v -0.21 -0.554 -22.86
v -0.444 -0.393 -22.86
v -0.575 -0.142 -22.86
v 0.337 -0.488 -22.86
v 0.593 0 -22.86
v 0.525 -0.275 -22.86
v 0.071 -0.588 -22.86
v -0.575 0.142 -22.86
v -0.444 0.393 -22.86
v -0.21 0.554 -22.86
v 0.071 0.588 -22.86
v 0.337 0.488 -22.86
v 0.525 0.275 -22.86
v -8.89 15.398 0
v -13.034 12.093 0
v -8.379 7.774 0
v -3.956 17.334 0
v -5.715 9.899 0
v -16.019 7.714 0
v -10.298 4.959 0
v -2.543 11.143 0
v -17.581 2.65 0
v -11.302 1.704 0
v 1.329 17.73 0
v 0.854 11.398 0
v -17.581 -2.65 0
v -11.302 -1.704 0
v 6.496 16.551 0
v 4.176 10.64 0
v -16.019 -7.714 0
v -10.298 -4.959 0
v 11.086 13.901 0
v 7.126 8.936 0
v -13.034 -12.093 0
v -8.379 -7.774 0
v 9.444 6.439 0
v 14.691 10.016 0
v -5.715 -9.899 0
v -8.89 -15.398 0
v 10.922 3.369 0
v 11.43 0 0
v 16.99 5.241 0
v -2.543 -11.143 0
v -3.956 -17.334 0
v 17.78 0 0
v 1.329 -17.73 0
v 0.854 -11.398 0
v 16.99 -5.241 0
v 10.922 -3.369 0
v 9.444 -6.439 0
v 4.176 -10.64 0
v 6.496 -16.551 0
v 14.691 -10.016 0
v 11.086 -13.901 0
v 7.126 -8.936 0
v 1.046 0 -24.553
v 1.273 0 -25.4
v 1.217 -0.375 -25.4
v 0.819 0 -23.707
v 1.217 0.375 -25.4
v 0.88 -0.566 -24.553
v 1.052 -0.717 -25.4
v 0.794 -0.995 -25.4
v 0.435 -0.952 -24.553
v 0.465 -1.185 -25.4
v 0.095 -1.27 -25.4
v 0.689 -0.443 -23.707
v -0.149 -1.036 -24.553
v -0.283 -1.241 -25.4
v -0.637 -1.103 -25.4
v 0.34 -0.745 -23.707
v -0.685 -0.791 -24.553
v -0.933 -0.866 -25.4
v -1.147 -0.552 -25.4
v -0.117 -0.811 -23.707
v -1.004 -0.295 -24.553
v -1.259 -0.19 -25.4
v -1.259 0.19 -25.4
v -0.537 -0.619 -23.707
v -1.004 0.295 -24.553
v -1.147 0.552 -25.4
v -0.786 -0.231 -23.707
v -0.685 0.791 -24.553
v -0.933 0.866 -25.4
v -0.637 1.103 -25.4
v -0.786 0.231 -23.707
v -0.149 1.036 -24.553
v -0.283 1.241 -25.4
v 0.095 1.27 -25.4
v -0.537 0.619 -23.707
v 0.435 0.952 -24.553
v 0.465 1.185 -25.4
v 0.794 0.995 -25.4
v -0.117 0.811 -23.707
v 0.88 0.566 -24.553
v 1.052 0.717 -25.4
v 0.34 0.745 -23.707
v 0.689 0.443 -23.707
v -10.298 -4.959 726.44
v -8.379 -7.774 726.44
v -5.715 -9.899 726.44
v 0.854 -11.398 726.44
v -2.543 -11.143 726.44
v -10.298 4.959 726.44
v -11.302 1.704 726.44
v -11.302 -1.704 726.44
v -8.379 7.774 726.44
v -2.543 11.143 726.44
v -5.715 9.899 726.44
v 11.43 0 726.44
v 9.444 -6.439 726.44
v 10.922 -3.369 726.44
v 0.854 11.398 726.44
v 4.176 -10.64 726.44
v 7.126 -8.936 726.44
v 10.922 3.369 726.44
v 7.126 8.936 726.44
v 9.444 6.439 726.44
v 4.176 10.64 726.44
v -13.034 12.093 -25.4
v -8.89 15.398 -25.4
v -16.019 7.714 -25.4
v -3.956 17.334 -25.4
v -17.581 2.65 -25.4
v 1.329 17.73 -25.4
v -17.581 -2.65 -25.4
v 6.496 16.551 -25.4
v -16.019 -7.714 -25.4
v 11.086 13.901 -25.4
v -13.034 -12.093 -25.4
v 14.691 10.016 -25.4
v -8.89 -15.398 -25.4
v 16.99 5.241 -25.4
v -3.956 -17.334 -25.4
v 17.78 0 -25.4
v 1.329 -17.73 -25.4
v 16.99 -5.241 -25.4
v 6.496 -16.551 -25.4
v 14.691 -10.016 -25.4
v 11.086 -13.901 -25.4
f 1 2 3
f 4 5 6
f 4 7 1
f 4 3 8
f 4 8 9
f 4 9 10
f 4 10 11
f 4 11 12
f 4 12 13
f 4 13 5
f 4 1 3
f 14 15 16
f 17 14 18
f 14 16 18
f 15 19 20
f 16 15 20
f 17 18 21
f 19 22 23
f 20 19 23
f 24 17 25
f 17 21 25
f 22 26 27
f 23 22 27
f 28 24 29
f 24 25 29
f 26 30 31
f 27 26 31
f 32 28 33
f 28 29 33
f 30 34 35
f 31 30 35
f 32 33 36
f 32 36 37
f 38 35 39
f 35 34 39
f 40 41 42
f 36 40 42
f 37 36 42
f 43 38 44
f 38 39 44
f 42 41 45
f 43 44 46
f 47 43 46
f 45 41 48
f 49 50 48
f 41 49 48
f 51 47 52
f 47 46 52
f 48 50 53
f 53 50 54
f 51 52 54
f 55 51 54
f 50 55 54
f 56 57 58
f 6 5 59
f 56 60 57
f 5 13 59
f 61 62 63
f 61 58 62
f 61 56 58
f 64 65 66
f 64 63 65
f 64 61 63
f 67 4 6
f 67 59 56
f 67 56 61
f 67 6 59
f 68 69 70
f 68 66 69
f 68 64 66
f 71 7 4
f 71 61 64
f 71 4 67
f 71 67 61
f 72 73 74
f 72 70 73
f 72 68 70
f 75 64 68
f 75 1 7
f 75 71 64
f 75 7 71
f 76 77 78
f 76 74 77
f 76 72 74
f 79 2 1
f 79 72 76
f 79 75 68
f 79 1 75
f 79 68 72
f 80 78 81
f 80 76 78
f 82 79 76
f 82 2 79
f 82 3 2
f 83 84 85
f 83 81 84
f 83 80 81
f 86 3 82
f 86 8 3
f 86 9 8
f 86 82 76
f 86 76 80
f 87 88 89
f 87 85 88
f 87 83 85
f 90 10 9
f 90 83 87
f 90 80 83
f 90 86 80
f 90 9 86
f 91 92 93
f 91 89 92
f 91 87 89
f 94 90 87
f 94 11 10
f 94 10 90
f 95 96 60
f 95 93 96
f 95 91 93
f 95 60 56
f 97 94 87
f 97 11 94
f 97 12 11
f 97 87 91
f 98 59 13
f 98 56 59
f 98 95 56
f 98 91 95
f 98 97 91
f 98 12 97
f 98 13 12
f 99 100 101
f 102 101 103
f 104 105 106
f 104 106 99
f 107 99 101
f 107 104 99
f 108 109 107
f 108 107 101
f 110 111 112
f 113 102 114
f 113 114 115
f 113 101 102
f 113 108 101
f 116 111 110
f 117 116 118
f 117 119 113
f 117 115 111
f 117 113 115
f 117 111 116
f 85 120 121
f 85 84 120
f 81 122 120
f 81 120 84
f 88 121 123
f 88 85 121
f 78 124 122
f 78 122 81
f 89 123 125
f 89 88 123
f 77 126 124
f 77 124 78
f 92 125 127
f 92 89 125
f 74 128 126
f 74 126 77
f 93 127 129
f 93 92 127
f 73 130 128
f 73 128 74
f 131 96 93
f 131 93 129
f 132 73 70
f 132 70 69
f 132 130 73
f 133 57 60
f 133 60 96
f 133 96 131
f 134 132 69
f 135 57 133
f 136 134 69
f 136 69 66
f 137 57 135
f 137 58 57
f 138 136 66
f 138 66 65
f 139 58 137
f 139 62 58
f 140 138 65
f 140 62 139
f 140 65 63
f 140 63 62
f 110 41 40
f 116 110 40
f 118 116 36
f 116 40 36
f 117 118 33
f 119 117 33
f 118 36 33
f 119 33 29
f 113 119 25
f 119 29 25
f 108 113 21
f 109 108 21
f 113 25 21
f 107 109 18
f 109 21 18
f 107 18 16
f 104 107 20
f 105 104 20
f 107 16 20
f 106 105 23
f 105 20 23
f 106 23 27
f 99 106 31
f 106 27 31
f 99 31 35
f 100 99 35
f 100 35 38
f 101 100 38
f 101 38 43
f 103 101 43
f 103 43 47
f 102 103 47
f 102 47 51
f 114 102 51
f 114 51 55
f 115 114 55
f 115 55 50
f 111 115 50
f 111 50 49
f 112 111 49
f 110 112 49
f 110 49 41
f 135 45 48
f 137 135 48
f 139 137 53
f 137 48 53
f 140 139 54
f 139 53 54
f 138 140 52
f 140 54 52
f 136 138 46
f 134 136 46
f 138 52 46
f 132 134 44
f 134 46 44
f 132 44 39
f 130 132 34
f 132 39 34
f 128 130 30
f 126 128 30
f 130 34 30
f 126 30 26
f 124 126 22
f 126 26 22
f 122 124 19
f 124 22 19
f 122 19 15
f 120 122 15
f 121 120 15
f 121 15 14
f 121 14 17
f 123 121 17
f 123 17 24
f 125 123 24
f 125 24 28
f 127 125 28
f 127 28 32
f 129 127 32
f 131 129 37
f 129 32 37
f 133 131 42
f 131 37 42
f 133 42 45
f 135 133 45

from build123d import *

# Parameters (mm, degrees)
F0_R     = 11.43
F1_DEPTH = 774.7
F2_R     = 17.78
F3_DEPTH = 25.4
F4_DEPTH = 48.26
F5_R     = 1.2732150617
F6_DEPTH = 2.54
F6_TAPER = 15


with BuildPart() as f1:
    # F0 (on Top) → F1 (new body)
    with BuildSketch(Plane.XY):
        Circle(F0_R)
    extrude(amount=F1_DEPTH)

    # F2 (on face) → F3 (join)
    with BuildSketch(Plane(origin=(0, 0, 0), x_dir=(1, 0, 0), z_dir=(0, 0, -1))):
        Circle(F2_R)
    extrude(amount=F3_DEPTH)

    # F4 (cut): a face of the model
    f4_faces = [f1.faces().sort_by_distance(p)[0] for p in [
        (0, 0, 774.7),
    ]]
    extrude(f4_faces, amount=-F4_DEPTH, mode=Mode.SUBTRACT)

    # F5 (on face) → F6 (cut)
    with BuildSketch(Plane(origin=(0, 0, -25.4), x_dir=(1, 0, 0), z_dir=(0, 0, -1))):
        Circle(F5_R)
    extrude(amount=-F6_DEPTH, taper=F6_TAPER, mode=Mode.SUBTRACT)


solid = f1.part
